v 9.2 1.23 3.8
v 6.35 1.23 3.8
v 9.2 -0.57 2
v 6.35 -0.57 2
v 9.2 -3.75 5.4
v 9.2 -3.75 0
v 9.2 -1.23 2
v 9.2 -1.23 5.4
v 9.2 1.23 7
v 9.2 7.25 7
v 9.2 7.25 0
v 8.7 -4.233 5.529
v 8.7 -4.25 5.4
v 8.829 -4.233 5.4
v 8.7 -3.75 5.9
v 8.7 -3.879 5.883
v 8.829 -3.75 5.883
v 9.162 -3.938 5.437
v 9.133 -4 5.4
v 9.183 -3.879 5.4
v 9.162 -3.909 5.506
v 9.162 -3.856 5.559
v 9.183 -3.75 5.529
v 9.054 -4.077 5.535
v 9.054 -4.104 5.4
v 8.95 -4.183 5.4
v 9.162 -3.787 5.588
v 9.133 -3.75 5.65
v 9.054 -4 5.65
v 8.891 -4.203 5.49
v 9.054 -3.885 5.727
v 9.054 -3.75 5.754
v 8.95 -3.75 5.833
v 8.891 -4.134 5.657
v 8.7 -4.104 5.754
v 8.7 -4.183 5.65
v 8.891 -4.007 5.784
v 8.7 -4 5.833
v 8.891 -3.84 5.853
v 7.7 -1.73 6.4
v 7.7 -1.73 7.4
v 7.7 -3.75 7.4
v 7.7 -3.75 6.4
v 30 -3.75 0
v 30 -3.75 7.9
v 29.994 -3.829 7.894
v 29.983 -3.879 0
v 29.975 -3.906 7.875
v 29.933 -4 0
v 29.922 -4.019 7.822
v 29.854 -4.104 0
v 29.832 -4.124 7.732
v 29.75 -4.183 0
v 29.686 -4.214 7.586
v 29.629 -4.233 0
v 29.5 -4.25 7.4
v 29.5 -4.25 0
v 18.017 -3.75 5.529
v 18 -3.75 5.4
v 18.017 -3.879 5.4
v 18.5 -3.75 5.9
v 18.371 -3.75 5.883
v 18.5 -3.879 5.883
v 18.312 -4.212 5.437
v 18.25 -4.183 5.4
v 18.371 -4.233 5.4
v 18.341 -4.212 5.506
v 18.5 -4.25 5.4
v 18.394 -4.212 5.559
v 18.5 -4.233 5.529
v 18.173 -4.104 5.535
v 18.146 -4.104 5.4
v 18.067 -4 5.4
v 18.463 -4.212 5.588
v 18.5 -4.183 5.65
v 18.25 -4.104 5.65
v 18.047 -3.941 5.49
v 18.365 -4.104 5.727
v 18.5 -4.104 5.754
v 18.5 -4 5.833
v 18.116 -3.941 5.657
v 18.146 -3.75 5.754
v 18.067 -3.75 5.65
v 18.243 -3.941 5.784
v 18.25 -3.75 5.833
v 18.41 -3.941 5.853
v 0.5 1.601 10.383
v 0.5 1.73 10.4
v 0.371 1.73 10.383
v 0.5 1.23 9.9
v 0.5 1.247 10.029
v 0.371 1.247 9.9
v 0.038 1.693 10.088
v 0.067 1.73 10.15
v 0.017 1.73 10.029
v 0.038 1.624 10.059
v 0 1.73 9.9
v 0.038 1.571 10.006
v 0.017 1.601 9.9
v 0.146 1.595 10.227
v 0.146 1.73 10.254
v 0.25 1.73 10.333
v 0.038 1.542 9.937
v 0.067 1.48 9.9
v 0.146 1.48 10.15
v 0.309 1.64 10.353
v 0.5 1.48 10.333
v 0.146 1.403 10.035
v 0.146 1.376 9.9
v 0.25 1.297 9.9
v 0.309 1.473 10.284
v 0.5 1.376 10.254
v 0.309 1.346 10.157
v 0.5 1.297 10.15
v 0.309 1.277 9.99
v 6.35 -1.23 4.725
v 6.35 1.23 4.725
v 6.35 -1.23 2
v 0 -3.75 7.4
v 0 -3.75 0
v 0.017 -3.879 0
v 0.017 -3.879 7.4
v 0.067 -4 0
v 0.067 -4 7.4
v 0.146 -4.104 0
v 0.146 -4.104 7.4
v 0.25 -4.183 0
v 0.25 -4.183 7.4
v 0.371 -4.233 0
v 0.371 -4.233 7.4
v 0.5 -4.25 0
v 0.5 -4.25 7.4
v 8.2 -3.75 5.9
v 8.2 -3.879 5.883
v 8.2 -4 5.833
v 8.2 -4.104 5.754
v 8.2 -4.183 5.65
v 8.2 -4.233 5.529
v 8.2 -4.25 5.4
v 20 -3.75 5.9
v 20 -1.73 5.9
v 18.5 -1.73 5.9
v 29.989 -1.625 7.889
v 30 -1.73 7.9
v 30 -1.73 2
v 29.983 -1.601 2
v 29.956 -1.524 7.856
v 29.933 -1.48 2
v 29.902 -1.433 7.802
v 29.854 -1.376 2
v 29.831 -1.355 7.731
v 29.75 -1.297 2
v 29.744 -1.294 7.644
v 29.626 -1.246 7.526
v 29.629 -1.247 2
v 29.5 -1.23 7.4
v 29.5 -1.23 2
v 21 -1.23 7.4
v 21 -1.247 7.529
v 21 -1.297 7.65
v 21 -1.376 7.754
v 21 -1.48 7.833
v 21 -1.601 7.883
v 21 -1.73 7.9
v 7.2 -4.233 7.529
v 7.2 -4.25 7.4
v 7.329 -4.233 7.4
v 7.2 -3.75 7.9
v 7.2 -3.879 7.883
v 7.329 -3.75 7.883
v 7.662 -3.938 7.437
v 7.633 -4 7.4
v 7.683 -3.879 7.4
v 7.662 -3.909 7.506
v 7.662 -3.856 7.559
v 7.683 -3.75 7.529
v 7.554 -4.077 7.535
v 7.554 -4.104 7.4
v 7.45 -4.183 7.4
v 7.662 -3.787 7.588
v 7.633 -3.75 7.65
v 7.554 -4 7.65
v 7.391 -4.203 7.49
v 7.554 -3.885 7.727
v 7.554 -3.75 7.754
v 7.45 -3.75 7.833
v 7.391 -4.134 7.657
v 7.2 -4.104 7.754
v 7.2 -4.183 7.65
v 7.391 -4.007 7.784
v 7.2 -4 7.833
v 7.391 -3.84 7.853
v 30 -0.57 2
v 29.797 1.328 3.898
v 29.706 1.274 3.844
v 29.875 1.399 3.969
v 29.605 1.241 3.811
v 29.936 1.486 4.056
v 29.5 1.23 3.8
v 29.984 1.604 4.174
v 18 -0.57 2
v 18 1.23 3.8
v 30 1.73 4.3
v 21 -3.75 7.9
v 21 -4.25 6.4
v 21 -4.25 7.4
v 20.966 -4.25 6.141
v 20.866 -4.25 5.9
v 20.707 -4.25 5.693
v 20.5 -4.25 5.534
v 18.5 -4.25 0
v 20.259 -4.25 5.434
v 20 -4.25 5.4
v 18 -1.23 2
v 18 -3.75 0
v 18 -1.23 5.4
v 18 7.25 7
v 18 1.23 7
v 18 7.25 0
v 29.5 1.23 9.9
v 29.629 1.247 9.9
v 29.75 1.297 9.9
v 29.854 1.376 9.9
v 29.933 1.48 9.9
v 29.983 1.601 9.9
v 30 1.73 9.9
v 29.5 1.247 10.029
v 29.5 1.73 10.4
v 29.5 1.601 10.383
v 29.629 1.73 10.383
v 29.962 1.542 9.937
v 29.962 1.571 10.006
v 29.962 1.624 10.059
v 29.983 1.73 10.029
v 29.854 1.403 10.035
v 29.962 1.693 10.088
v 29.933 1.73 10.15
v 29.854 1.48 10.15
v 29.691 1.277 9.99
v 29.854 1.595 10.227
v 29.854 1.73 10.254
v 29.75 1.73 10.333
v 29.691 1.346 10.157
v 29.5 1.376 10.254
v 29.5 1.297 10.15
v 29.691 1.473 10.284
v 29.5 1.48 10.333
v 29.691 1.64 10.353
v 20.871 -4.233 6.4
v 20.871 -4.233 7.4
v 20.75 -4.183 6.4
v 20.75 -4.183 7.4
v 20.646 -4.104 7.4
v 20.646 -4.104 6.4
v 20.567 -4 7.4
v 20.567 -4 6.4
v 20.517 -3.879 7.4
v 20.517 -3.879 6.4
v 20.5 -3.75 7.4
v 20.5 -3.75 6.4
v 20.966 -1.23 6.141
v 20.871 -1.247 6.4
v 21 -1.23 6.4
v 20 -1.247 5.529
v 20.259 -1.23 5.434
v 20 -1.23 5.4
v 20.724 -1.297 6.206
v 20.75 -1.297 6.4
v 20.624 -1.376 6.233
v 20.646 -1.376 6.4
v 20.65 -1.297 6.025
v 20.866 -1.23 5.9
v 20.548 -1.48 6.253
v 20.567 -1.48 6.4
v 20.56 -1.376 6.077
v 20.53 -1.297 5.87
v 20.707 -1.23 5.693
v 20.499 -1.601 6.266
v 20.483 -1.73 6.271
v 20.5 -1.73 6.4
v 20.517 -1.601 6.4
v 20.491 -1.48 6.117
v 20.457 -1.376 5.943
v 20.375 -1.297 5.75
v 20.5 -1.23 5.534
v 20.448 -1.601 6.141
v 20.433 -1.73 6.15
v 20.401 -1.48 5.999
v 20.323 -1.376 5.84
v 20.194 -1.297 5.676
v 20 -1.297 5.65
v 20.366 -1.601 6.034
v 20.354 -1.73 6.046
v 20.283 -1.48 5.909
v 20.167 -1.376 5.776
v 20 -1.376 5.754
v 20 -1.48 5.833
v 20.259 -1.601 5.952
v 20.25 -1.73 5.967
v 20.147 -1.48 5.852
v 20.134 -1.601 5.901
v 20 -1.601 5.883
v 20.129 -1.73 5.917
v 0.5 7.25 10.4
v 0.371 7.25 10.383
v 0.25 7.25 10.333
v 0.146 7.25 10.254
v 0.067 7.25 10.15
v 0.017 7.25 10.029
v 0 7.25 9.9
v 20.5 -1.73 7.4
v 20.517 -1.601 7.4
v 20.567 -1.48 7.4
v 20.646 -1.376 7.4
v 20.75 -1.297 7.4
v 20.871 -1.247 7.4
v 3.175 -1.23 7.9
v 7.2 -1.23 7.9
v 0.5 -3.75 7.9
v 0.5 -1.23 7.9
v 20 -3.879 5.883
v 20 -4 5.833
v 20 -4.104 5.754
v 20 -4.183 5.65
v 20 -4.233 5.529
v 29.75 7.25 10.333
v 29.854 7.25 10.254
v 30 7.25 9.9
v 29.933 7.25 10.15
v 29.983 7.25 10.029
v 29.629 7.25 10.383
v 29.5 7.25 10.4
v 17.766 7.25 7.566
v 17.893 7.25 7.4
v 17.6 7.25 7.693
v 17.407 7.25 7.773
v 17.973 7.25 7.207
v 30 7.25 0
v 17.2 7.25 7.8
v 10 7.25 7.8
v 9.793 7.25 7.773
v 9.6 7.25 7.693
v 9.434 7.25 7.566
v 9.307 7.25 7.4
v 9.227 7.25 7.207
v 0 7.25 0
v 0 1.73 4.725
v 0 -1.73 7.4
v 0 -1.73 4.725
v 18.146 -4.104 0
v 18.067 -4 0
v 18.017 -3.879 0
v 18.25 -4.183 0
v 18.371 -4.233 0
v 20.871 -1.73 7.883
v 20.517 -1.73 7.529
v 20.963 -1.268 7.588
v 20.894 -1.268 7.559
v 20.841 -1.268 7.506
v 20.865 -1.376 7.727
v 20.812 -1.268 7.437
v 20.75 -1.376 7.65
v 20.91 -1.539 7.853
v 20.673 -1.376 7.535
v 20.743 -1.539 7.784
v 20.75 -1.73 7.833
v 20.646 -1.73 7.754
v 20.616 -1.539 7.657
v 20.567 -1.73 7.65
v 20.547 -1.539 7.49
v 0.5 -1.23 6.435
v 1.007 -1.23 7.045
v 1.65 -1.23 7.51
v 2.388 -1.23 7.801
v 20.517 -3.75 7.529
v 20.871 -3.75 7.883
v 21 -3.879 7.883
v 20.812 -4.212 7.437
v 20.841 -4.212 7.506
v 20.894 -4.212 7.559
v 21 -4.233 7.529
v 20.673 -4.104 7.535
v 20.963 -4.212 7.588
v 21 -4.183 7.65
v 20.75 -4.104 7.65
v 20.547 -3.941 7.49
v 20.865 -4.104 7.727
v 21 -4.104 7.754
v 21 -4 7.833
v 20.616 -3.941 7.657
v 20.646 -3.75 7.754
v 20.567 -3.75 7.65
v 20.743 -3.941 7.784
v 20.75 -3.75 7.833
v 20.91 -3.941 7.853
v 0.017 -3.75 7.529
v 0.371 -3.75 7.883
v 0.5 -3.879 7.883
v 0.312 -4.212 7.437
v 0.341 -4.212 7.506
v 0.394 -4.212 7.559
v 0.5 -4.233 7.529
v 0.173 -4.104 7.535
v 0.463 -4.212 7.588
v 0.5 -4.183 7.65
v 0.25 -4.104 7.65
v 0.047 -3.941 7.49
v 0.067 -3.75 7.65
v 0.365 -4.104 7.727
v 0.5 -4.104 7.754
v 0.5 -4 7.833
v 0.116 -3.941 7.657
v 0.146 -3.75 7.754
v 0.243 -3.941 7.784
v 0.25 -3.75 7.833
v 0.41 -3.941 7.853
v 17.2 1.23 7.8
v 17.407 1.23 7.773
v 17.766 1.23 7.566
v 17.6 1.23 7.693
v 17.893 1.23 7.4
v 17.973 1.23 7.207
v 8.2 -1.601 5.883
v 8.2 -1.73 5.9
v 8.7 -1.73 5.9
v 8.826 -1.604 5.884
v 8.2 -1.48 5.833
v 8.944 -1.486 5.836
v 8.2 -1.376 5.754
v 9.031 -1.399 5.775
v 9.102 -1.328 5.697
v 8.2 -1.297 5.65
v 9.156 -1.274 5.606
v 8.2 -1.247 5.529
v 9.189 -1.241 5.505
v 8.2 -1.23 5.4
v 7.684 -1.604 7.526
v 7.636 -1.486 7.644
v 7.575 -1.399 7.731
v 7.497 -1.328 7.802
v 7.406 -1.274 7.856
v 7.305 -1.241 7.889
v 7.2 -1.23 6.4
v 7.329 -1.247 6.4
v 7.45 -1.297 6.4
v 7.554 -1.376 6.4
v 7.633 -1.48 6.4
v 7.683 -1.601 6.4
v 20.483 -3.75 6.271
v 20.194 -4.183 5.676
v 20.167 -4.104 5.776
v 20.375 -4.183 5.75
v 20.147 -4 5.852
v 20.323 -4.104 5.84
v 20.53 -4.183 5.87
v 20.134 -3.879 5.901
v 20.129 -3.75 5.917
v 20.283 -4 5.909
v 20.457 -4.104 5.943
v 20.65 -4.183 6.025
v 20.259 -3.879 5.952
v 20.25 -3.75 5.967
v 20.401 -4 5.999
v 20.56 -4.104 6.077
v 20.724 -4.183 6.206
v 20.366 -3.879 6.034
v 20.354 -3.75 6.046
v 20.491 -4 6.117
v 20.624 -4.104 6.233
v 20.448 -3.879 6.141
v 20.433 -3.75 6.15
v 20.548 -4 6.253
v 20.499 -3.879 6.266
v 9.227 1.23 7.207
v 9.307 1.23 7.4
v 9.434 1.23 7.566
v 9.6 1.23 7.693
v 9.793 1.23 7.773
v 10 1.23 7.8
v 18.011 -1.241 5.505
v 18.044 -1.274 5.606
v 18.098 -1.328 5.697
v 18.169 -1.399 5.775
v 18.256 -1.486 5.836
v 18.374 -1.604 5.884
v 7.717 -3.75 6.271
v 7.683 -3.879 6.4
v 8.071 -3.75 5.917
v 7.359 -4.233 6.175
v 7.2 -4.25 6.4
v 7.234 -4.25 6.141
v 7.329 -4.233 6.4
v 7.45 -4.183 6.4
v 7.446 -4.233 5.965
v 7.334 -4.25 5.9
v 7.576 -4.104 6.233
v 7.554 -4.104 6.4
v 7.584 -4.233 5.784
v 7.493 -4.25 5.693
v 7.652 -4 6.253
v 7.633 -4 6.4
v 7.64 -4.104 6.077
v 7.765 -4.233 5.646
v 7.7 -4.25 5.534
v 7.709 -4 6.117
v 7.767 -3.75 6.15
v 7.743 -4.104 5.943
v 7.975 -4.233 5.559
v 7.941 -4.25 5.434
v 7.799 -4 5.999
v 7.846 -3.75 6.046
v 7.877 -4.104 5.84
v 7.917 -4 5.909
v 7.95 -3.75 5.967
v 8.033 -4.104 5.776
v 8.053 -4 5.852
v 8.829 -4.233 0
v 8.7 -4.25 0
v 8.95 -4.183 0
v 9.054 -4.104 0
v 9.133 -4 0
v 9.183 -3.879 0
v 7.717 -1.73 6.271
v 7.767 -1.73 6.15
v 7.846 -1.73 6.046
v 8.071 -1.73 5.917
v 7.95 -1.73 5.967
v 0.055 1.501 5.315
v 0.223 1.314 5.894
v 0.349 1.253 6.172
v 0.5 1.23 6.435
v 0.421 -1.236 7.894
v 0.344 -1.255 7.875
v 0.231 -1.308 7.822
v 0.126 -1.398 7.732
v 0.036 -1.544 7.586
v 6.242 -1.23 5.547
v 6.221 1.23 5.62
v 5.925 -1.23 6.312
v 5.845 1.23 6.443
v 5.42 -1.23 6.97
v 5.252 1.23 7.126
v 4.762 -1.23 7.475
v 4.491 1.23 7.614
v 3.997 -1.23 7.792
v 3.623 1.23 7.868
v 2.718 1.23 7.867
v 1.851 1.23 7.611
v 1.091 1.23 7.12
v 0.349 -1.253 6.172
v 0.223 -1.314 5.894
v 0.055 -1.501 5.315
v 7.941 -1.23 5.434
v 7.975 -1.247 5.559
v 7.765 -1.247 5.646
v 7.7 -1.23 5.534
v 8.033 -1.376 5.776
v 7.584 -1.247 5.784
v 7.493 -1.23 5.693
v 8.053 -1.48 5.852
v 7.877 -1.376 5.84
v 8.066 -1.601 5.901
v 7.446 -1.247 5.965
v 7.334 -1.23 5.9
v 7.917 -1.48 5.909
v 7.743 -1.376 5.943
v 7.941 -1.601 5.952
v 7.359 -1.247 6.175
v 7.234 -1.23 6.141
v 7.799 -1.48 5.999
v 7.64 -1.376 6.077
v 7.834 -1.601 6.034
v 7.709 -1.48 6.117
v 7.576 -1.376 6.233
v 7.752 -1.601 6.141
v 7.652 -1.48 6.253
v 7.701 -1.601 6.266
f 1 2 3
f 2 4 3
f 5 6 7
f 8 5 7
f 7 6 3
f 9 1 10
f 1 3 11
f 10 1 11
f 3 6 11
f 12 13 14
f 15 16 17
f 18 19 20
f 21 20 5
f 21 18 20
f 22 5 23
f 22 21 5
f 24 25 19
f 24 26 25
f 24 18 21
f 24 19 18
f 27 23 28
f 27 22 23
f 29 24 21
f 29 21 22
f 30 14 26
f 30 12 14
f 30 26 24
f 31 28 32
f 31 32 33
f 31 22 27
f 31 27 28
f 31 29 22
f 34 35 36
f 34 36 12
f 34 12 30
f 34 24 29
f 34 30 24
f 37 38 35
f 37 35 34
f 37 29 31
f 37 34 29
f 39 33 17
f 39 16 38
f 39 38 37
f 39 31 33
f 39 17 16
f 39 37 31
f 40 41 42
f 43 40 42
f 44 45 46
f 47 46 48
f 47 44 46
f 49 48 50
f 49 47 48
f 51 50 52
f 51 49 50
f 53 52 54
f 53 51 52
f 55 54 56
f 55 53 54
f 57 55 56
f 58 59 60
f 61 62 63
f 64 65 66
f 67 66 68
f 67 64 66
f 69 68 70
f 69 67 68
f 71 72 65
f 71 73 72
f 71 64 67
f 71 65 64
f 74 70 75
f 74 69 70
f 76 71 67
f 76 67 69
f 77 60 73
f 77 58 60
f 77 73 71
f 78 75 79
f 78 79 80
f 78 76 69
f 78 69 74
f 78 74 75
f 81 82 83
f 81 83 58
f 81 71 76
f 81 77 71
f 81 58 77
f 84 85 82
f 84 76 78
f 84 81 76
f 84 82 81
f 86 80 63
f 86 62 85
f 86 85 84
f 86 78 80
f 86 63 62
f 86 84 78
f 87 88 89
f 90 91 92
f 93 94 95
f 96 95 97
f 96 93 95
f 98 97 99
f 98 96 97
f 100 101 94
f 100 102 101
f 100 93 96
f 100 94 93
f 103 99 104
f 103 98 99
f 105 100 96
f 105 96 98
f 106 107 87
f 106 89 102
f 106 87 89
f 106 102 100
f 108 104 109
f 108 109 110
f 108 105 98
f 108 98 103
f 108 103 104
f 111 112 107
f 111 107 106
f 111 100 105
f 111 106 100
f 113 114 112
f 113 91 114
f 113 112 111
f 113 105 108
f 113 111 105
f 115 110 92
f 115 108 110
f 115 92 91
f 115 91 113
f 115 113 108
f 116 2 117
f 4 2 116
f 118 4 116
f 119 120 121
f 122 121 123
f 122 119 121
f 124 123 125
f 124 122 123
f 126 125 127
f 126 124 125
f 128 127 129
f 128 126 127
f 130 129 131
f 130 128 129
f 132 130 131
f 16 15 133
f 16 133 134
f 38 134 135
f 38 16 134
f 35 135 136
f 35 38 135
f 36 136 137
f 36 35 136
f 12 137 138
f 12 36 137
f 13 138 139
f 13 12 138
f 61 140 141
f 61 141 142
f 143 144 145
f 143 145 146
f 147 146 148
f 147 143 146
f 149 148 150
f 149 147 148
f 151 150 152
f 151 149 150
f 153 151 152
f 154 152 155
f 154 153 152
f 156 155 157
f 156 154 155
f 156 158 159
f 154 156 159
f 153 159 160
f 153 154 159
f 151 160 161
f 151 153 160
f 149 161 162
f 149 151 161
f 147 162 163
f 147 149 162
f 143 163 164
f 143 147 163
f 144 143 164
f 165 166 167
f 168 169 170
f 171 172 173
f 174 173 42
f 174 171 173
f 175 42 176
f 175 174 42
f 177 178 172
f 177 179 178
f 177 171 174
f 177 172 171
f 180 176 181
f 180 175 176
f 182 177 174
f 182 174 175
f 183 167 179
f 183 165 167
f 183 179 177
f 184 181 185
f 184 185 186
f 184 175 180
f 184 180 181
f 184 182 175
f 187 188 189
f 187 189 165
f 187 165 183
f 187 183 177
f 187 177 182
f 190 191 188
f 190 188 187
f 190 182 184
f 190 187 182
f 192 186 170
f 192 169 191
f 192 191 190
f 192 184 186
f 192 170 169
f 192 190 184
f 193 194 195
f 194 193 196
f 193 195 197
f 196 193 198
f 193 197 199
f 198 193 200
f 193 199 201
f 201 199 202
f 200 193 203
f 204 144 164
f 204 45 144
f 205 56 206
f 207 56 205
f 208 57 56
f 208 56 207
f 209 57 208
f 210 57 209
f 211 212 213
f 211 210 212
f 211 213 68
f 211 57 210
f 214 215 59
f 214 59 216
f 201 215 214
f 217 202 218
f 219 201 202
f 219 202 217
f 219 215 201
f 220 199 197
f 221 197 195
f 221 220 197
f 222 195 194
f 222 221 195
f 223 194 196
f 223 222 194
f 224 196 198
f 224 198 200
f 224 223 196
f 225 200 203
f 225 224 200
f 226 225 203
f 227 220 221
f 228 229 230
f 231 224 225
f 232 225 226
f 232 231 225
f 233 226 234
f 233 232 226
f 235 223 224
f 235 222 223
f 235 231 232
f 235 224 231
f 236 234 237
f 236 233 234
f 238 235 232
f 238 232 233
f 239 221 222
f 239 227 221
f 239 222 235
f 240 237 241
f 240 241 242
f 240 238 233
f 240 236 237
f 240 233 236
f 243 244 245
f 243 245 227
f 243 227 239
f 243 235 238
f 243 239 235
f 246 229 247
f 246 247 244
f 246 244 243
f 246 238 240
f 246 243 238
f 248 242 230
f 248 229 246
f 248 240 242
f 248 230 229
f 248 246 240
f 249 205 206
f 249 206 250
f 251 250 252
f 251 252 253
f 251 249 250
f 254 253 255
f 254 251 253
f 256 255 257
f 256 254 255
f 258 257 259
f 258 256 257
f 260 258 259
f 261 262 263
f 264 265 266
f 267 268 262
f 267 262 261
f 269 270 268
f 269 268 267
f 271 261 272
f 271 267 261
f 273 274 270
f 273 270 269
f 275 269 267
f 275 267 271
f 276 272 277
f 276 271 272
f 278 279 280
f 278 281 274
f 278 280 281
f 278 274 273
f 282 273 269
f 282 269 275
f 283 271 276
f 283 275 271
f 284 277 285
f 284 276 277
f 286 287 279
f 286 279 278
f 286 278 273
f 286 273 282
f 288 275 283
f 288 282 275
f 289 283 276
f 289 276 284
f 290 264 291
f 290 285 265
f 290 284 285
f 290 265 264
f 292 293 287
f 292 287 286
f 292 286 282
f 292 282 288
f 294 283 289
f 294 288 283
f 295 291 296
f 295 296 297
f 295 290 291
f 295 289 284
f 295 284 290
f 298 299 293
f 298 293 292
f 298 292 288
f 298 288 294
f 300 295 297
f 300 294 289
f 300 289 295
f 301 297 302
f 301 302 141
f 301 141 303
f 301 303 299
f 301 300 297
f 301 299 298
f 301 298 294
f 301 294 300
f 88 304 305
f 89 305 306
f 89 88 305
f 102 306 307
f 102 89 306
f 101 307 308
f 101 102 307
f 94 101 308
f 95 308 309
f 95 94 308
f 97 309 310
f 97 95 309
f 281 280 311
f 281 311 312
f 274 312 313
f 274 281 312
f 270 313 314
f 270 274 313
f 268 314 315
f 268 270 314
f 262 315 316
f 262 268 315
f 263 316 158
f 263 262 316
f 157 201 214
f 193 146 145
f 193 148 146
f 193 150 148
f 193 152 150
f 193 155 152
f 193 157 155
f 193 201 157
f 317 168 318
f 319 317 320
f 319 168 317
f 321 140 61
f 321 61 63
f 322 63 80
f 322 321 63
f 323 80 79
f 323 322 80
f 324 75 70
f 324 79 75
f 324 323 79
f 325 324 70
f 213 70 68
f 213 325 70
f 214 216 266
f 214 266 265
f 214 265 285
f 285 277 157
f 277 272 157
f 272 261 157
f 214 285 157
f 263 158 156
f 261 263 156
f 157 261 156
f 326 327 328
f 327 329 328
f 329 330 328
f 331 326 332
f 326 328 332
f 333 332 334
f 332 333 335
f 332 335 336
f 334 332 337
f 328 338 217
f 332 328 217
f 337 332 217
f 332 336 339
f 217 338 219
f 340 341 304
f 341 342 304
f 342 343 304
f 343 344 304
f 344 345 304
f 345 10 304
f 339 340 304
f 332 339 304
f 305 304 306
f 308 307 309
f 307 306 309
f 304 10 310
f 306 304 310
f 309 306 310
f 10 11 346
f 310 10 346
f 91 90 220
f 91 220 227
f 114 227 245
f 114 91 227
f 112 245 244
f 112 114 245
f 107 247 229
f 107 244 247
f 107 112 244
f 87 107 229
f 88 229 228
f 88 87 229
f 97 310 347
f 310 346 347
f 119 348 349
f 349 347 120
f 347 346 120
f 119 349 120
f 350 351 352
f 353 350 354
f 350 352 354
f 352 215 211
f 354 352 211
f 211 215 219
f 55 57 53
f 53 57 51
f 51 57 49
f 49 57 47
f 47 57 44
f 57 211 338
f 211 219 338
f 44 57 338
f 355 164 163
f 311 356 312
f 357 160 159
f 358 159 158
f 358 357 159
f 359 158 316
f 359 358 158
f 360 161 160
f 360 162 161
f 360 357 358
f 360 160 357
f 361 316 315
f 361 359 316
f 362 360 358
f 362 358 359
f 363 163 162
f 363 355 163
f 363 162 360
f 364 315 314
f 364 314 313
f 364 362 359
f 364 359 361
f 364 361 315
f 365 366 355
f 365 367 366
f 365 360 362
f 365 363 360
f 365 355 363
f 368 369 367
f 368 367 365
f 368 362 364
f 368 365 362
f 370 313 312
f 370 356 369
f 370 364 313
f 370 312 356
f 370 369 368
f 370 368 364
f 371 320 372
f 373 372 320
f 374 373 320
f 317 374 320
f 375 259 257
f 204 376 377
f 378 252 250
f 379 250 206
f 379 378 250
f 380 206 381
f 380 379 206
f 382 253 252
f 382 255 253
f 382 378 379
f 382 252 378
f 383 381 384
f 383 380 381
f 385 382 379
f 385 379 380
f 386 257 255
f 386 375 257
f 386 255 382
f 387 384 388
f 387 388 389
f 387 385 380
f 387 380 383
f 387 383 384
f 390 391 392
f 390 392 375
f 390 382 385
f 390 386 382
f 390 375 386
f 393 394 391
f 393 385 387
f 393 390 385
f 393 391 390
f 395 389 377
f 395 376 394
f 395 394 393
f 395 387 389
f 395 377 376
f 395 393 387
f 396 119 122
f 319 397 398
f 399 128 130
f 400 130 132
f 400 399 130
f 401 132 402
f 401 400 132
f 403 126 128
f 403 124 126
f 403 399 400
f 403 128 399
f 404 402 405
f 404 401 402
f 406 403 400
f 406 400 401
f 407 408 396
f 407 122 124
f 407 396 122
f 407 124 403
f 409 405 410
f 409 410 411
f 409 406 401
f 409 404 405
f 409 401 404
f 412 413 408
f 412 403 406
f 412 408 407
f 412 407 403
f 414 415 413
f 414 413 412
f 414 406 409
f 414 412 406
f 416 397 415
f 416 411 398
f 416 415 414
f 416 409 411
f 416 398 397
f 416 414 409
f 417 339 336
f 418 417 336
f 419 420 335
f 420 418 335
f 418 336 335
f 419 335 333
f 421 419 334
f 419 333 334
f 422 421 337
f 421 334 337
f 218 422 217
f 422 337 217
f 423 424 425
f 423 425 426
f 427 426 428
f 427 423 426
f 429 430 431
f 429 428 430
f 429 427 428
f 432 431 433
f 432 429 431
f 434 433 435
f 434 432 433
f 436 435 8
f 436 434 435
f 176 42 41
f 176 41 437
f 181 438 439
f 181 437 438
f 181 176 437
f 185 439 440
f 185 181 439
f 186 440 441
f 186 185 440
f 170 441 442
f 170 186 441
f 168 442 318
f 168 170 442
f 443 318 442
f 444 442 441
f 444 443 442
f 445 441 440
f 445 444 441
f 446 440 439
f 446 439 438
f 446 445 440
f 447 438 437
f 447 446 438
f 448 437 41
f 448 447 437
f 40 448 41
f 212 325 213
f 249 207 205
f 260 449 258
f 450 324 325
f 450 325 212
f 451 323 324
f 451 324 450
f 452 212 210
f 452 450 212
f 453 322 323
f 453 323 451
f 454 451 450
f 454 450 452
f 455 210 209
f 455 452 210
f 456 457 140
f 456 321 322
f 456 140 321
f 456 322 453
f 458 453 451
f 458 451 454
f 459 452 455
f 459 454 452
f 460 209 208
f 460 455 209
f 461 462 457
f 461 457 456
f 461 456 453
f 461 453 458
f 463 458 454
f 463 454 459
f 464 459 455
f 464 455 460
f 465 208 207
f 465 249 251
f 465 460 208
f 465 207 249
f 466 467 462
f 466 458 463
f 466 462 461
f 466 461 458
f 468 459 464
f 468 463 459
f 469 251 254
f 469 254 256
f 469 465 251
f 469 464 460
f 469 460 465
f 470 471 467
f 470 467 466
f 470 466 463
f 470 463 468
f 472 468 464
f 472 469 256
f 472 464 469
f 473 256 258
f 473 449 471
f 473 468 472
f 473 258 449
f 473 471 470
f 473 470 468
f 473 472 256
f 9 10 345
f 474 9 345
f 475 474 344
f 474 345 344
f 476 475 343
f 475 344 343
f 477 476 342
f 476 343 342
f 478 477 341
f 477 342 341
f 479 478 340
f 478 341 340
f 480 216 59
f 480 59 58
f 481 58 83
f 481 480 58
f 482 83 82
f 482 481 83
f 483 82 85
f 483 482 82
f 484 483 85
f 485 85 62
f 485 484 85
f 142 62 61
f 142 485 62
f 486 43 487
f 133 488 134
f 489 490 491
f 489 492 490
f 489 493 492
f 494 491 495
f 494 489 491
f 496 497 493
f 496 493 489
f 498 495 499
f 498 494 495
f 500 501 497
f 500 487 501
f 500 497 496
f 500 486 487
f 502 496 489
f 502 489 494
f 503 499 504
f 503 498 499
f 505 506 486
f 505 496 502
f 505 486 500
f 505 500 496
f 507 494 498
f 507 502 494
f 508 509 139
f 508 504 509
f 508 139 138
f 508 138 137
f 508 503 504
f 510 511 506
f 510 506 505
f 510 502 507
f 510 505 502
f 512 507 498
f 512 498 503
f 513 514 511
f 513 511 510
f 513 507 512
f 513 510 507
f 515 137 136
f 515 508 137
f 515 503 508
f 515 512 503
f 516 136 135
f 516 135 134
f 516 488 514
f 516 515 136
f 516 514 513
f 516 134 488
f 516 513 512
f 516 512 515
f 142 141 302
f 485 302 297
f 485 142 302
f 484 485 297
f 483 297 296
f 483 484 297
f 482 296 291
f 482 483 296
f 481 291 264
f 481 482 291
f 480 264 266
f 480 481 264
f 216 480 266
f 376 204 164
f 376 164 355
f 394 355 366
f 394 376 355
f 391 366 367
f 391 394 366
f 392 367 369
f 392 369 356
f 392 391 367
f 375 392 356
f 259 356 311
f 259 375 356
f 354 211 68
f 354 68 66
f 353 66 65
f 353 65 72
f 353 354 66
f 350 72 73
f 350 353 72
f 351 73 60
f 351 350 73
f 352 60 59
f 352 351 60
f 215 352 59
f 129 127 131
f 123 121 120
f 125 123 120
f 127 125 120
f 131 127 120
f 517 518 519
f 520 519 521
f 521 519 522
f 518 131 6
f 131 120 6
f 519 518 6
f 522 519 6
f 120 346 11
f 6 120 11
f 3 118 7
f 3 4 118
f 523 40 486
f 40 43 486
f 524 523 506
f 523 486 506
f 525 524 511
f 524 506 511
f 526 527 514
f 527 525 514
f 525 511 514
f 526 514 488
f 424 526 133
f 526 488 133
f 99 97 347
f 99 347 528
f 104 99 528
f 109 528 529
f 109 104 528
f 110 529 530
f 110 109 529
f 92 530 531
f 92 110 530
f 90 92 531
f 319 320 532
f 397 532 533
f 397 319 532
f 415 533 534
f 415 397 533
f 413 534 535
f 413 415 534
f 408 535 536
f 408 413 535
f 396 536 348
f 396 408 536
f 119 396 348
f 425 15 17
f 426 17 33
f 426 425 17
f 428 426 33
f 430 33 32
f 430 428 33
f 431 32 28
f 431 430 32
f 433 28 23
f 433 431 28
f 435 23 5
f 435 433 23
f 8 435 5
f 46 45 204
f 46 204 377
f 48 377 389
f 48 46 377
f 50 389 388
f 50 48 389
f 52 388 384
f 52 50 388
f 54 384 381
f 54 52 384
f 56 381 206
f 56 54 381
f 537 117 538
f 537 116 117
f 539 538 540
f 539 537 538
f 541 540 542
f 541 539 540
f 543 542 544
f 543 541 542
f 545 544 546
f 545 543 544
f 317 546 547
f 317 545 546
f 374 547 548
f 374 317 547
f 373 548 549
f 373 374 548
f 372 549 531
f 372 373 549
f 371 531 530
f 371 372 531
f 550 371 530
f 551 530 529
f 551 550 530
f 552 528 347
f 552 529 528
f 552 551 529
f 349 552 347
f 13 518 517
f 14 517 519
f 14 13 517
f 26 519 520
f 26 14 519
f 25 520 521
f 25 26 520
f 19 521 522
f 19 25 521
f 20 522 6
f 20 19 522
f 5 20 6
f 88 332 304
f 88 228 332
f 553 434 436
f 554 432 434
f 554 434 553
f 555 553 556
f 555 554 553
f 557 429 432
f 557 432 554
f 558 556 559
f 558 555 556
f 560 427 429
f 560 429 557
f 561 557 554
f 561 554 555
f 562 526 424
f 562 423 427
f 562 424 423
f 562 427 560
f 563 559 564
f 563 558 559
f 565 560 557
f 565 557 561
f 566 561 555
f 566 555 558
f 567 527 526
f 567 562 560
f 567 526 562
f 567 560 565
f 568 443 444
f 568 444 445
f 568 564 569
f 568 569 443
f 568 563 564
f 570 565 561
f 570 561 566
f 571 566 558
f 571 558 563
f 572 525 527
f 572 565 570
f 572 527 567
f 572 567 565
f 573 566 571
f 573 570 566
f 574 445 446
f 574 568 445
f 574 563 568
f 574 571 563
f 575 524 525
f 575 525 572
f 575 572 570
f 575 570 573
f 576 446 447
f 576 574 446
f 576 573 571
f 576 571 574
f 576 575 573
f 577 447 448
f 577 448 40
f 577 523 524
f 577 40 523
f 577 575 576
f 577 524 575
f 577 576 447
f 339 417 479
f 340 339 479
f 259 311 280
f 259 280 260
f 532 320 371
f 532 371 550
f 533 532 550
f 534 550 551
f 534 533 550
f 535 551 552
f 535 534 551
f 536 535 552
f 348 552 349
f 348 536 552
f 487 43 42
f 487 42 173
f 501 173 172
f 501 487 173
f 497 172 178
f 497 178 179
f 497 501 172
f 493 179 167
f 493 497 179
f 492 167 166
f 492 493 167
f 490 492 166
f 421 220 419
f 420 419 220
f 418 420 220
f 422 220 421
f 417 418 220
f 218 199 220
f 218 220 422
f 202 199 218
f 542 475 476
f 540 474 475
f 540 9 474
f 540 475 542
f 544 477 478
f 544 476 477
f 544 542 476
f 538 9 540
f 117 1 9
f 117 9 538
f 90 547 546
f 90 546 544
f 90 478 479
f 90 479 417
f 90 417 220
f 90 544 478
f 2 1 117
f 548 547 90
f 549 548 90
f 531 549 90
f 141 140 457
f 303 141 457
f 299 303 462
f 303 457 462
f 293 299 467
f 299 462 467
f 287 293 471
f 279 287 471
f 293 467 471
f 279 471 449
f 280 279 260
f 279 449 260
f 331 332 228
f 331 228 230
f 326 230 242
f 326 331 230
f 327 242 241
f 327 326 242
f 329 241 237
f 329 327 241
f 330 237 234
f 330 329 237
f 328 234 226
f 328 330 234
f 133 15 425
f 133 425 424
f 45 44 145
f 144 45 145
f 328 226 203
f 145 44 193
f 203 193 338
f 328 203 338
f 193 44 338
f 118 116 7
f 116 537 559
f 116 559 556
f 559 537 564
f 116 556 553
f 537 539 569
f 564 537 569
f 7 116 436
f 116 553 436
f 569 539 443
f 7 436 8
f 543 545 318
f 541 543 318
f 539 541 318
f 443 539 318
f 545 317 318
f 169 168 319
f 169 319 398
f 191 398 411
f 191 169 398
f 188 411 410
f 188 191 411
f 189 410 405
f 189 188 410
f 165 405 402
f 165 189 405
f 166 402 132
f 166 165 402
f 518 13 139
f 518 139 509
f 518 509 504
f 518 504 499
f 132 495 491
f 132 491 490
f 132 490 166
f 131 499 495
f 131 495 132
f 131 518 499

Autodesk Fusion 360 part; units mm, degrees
sketch "Boceto1" plane through (0, 0, 0) normal (0, 0, 1) x (1, 0, 0)
  line L0 (0, 7.25) -> (30, 7.25)
  line L1 (30, 7.25) -> (30, -4.25)
  line L2 (30, -4.25) -> (0, -4.25)
  line L3 (0, -4.25) -> (0, 7.25)
  dimension "d1" = 30
  dimension "d2" = 11.5
  dimension "d3" = 7.25
extrude "Extruir1" add sketch "Boceto1" along normal blind 2
sketch "Boceto2" plane through (0, 0, 2) normal (0, 0, 1) x (-1, 0, 0)
  line L0 (0, 4.25) -> (-30, 4.25)
  line L1 (-30, 4.25) -> (-30, -7.25)
  line L2 (-30, -7.25) -> (0, -7.25)
  line L3 (0, -7.25) -> (0, 4.25)
  line L4 (0, -1.23) -> (-30, -1.23)
  line L5 (0, 1.23) -> (-30, 1.23)
  line L6 (-6.35, -1.23) -> (-6.35, 1.23)
  line L7 (-9.2, -1.23) -> (-9.2, 1.23)
  line L8 (-18, -1.23) -> (-18, 1.23)
  line L9 (0, -0.5) -> (-30, -0.5)
  dimension "d6" = 2.46
  dimension "d7" = 1.23
  dimension "d8" = 6.35
  dimension "d9" = 9.2
  dimension "d10" = 18
extrude "Extruir2" add sketch "Boceto2" along normal blind 5.9 contours L3 L5 L6 L9 | L3 L4 L6 L9
sketch "Boceto3" plane through (0, -1.23, 0) normal (0, -1, 0) x (1, 0, 0)
  line L0 (0, 2) -> (6.35, 2)
  line L1 (6.35, 2) -> (6.35, 7.9)
  line L2 (6.35, 7.9) -> (0, 7.9)
  line L3 (0, 7.9) -> (0, 2)
  arc A0 (6.35, 4.725) -> (0, 4.725) centre (3.175, 4.725) ccw
  point P0 (3.175, 4.725)
  dimension "d13" = 3.175
  dimension "d14" = 3.175
  dimension "d54" = 3.175
  dimension "d55" = 3.175
extrude "Extruir3" cut sketch "Boceto3" against normal blind 3 contours L2 L3 A0 | L1 L2 A0
extrude "Extruir4" cut sketch "Boceto2" against normal blind 2 contours L5 L7 L8 L9 | L4 L7 L8 L9
extrude "Extruir5" add sketch "Boceto2" along normal blind 5.9 contours L0 L1 L3 L5 | L1 L2 L3 L4
chamfer "Chaflán1" distance 1.8 angle 45 2 edges at (7.775, 1.23, 2) (24, 1.23, 2)
sketch "Boceto4" plane through (0, -1.23, 0) normal (0, 1, 0) x (-1, 0, 0)
  line L0 (-18, 2) -> (-18, 0)
  line L1 (-18, 0) -> (-9.2, 0)
  line L2 (-9.2, 0) -> (-9.2, 2)
  line L3 (-9.2, 2) -> (-6.35, 2)
  line L4 (-6.35, 2) -> (-6.35, 4.725)
  arc A0 (-3.175, 7.9) -> (-6.35, 4.725) centre (-3.175, 4.725) ccw
  line L5 (-3.175, 7.9) -> (-30, 7.9)
  line L6 (-30, 7.9) -> (-30, 2)
  line L7 (-30, 2) -> (-18, 2)
  line L8 (-9.2, 2) -> (-18, 2)
extrude "Extruir6" cut sketch "Boceto4" against normal blind 5 contours L0 L1 L2 L8
sketch "Boceto5" plane through (0, 1.23, 0) normal (0, -1, 0) x (1, 0, 0)
  line L0 (9.2, 3.8) -> (9.2, 0)
  line L1 (9.2, 0) -> (18, 0)
  line L2 (18, 0) -> (18, 3.8)
  line L3 (30, 3.8) -> (30, 7.9)
  line L4 (30, 7.9) -> (3.175, 7.9)
  arc A0 (6.35, 4.725) -> (3.175, 7.9) centre (3.175, 4.725) ccw
  line L5 (6.35, 4.725) -> (6.35, 3.8)
  line L6 (18, 3.8) -> (9.2, 3.8)
  line L7 (18, 3.8) -> (30, 3.8)
  line L8 (6.35, 3.8) -> (9.2, 3.8)
extrude "Extruir7" cut sketch "Boceto5" against normal blind 7 contours L0 L1 L2 L6
extrude "Extruir8" cut 2 faces at (15.0667, -2.2367, 2) (12.1333, 5.2433, 3.8) along direction (0, 0, 1) blind 4
extrude "Extruir10" add 1 faces at (11.0583, 5.2433, 7.9) along direction (0, 0, 1) blind 2.5
sketch "Boceto8" plane through (0, 0, 7.9) normal (0, 0, 1) x (-1, 0, 0)
  line L0 (-3.175, 1.23) -> (0, 1.23)
  line L1 (0, 1.23) -> (0, 4.25)
  line L2 (0, 4.25) -> (-30, 4.25)
  line L3 (-30, 4.25) -> (-30, 1.23)
  line L4 (-30, 1.23) -> (-3.175, 1.23)
  line L5 (-7.7, 1.23) -> (-7.7, 4.25)
  line L6 (-20.5, 1.23) -> (-20.5, 4.25)
  point P0 (0, 4.25)
  point P1 (-9.2, 4.25)
  point P2 (-18, 4.25)
  point P3 (-30, 4.25)
  dimension "d41" = 9.2
  dimension "d42" = 7.7
  dimension "d43" = 12
  dimension "d44" = 9.5
extrude "Extruir12" cut sketch "Boceto8" against normal blind 2 contours L2 L4 L5 L6
fillet "Empalme4" radius 0.5 29 edges at (0, -2.74, 7.9) (3.85, -4.25, 7.9) (7.7, -2.74, 7.9) (7.7, -4.25, 6.9) (7.7, -1.23, 6.9) (7.7, -2.74, 5.9) (8.45, -1.23, 5.9) (8.45, -4.25, 5.9) (9.2, -2.74, 5.9) (19.25, -1.23, 5.9) (18, -2.74, 5.9) (19.25, -4.25, 5.9) (20.5, -2.74, 7.9) (25.25, -1.23, 7.9) (25.25, -4.25, 7.9) (20.5, -1.23, 6.9) (20.5, -4.25, 6.9) (20.5, -2.74, 5.9) (15, 1.23, 10.4) (0, 4.24, 10.4) (30, 4.24, 10.4) (0, -4.25, 3.95) (9.2, -4.25, 2.95) (18, -4.25, 2.95) (30, -4.25, 3.95) (0, 1.23, 7.5625) (30, 1.23, 7.1) (30, -1.23, 4.95) (0, -1.23, 6.3125)
fillet "Empalme5" radius 0.8 2 edges at (9.2, 4.24, 7.8) (18, 4.24, 7.8)
equation "d3 = d2 / 2 + 1.5 mm"
equation "d7 = d6 / 2"
equation "d9 = d10 - 8.8 mm"
equation "d13 = d8 / 2"
equation "d14 = d13"
equation "d42 = d41 - 1.5 mm"
equation "d44 = d43 - 2.5 mm"
equation "d54 = d8 / 2"
equation "d55 = d8 / 2"
